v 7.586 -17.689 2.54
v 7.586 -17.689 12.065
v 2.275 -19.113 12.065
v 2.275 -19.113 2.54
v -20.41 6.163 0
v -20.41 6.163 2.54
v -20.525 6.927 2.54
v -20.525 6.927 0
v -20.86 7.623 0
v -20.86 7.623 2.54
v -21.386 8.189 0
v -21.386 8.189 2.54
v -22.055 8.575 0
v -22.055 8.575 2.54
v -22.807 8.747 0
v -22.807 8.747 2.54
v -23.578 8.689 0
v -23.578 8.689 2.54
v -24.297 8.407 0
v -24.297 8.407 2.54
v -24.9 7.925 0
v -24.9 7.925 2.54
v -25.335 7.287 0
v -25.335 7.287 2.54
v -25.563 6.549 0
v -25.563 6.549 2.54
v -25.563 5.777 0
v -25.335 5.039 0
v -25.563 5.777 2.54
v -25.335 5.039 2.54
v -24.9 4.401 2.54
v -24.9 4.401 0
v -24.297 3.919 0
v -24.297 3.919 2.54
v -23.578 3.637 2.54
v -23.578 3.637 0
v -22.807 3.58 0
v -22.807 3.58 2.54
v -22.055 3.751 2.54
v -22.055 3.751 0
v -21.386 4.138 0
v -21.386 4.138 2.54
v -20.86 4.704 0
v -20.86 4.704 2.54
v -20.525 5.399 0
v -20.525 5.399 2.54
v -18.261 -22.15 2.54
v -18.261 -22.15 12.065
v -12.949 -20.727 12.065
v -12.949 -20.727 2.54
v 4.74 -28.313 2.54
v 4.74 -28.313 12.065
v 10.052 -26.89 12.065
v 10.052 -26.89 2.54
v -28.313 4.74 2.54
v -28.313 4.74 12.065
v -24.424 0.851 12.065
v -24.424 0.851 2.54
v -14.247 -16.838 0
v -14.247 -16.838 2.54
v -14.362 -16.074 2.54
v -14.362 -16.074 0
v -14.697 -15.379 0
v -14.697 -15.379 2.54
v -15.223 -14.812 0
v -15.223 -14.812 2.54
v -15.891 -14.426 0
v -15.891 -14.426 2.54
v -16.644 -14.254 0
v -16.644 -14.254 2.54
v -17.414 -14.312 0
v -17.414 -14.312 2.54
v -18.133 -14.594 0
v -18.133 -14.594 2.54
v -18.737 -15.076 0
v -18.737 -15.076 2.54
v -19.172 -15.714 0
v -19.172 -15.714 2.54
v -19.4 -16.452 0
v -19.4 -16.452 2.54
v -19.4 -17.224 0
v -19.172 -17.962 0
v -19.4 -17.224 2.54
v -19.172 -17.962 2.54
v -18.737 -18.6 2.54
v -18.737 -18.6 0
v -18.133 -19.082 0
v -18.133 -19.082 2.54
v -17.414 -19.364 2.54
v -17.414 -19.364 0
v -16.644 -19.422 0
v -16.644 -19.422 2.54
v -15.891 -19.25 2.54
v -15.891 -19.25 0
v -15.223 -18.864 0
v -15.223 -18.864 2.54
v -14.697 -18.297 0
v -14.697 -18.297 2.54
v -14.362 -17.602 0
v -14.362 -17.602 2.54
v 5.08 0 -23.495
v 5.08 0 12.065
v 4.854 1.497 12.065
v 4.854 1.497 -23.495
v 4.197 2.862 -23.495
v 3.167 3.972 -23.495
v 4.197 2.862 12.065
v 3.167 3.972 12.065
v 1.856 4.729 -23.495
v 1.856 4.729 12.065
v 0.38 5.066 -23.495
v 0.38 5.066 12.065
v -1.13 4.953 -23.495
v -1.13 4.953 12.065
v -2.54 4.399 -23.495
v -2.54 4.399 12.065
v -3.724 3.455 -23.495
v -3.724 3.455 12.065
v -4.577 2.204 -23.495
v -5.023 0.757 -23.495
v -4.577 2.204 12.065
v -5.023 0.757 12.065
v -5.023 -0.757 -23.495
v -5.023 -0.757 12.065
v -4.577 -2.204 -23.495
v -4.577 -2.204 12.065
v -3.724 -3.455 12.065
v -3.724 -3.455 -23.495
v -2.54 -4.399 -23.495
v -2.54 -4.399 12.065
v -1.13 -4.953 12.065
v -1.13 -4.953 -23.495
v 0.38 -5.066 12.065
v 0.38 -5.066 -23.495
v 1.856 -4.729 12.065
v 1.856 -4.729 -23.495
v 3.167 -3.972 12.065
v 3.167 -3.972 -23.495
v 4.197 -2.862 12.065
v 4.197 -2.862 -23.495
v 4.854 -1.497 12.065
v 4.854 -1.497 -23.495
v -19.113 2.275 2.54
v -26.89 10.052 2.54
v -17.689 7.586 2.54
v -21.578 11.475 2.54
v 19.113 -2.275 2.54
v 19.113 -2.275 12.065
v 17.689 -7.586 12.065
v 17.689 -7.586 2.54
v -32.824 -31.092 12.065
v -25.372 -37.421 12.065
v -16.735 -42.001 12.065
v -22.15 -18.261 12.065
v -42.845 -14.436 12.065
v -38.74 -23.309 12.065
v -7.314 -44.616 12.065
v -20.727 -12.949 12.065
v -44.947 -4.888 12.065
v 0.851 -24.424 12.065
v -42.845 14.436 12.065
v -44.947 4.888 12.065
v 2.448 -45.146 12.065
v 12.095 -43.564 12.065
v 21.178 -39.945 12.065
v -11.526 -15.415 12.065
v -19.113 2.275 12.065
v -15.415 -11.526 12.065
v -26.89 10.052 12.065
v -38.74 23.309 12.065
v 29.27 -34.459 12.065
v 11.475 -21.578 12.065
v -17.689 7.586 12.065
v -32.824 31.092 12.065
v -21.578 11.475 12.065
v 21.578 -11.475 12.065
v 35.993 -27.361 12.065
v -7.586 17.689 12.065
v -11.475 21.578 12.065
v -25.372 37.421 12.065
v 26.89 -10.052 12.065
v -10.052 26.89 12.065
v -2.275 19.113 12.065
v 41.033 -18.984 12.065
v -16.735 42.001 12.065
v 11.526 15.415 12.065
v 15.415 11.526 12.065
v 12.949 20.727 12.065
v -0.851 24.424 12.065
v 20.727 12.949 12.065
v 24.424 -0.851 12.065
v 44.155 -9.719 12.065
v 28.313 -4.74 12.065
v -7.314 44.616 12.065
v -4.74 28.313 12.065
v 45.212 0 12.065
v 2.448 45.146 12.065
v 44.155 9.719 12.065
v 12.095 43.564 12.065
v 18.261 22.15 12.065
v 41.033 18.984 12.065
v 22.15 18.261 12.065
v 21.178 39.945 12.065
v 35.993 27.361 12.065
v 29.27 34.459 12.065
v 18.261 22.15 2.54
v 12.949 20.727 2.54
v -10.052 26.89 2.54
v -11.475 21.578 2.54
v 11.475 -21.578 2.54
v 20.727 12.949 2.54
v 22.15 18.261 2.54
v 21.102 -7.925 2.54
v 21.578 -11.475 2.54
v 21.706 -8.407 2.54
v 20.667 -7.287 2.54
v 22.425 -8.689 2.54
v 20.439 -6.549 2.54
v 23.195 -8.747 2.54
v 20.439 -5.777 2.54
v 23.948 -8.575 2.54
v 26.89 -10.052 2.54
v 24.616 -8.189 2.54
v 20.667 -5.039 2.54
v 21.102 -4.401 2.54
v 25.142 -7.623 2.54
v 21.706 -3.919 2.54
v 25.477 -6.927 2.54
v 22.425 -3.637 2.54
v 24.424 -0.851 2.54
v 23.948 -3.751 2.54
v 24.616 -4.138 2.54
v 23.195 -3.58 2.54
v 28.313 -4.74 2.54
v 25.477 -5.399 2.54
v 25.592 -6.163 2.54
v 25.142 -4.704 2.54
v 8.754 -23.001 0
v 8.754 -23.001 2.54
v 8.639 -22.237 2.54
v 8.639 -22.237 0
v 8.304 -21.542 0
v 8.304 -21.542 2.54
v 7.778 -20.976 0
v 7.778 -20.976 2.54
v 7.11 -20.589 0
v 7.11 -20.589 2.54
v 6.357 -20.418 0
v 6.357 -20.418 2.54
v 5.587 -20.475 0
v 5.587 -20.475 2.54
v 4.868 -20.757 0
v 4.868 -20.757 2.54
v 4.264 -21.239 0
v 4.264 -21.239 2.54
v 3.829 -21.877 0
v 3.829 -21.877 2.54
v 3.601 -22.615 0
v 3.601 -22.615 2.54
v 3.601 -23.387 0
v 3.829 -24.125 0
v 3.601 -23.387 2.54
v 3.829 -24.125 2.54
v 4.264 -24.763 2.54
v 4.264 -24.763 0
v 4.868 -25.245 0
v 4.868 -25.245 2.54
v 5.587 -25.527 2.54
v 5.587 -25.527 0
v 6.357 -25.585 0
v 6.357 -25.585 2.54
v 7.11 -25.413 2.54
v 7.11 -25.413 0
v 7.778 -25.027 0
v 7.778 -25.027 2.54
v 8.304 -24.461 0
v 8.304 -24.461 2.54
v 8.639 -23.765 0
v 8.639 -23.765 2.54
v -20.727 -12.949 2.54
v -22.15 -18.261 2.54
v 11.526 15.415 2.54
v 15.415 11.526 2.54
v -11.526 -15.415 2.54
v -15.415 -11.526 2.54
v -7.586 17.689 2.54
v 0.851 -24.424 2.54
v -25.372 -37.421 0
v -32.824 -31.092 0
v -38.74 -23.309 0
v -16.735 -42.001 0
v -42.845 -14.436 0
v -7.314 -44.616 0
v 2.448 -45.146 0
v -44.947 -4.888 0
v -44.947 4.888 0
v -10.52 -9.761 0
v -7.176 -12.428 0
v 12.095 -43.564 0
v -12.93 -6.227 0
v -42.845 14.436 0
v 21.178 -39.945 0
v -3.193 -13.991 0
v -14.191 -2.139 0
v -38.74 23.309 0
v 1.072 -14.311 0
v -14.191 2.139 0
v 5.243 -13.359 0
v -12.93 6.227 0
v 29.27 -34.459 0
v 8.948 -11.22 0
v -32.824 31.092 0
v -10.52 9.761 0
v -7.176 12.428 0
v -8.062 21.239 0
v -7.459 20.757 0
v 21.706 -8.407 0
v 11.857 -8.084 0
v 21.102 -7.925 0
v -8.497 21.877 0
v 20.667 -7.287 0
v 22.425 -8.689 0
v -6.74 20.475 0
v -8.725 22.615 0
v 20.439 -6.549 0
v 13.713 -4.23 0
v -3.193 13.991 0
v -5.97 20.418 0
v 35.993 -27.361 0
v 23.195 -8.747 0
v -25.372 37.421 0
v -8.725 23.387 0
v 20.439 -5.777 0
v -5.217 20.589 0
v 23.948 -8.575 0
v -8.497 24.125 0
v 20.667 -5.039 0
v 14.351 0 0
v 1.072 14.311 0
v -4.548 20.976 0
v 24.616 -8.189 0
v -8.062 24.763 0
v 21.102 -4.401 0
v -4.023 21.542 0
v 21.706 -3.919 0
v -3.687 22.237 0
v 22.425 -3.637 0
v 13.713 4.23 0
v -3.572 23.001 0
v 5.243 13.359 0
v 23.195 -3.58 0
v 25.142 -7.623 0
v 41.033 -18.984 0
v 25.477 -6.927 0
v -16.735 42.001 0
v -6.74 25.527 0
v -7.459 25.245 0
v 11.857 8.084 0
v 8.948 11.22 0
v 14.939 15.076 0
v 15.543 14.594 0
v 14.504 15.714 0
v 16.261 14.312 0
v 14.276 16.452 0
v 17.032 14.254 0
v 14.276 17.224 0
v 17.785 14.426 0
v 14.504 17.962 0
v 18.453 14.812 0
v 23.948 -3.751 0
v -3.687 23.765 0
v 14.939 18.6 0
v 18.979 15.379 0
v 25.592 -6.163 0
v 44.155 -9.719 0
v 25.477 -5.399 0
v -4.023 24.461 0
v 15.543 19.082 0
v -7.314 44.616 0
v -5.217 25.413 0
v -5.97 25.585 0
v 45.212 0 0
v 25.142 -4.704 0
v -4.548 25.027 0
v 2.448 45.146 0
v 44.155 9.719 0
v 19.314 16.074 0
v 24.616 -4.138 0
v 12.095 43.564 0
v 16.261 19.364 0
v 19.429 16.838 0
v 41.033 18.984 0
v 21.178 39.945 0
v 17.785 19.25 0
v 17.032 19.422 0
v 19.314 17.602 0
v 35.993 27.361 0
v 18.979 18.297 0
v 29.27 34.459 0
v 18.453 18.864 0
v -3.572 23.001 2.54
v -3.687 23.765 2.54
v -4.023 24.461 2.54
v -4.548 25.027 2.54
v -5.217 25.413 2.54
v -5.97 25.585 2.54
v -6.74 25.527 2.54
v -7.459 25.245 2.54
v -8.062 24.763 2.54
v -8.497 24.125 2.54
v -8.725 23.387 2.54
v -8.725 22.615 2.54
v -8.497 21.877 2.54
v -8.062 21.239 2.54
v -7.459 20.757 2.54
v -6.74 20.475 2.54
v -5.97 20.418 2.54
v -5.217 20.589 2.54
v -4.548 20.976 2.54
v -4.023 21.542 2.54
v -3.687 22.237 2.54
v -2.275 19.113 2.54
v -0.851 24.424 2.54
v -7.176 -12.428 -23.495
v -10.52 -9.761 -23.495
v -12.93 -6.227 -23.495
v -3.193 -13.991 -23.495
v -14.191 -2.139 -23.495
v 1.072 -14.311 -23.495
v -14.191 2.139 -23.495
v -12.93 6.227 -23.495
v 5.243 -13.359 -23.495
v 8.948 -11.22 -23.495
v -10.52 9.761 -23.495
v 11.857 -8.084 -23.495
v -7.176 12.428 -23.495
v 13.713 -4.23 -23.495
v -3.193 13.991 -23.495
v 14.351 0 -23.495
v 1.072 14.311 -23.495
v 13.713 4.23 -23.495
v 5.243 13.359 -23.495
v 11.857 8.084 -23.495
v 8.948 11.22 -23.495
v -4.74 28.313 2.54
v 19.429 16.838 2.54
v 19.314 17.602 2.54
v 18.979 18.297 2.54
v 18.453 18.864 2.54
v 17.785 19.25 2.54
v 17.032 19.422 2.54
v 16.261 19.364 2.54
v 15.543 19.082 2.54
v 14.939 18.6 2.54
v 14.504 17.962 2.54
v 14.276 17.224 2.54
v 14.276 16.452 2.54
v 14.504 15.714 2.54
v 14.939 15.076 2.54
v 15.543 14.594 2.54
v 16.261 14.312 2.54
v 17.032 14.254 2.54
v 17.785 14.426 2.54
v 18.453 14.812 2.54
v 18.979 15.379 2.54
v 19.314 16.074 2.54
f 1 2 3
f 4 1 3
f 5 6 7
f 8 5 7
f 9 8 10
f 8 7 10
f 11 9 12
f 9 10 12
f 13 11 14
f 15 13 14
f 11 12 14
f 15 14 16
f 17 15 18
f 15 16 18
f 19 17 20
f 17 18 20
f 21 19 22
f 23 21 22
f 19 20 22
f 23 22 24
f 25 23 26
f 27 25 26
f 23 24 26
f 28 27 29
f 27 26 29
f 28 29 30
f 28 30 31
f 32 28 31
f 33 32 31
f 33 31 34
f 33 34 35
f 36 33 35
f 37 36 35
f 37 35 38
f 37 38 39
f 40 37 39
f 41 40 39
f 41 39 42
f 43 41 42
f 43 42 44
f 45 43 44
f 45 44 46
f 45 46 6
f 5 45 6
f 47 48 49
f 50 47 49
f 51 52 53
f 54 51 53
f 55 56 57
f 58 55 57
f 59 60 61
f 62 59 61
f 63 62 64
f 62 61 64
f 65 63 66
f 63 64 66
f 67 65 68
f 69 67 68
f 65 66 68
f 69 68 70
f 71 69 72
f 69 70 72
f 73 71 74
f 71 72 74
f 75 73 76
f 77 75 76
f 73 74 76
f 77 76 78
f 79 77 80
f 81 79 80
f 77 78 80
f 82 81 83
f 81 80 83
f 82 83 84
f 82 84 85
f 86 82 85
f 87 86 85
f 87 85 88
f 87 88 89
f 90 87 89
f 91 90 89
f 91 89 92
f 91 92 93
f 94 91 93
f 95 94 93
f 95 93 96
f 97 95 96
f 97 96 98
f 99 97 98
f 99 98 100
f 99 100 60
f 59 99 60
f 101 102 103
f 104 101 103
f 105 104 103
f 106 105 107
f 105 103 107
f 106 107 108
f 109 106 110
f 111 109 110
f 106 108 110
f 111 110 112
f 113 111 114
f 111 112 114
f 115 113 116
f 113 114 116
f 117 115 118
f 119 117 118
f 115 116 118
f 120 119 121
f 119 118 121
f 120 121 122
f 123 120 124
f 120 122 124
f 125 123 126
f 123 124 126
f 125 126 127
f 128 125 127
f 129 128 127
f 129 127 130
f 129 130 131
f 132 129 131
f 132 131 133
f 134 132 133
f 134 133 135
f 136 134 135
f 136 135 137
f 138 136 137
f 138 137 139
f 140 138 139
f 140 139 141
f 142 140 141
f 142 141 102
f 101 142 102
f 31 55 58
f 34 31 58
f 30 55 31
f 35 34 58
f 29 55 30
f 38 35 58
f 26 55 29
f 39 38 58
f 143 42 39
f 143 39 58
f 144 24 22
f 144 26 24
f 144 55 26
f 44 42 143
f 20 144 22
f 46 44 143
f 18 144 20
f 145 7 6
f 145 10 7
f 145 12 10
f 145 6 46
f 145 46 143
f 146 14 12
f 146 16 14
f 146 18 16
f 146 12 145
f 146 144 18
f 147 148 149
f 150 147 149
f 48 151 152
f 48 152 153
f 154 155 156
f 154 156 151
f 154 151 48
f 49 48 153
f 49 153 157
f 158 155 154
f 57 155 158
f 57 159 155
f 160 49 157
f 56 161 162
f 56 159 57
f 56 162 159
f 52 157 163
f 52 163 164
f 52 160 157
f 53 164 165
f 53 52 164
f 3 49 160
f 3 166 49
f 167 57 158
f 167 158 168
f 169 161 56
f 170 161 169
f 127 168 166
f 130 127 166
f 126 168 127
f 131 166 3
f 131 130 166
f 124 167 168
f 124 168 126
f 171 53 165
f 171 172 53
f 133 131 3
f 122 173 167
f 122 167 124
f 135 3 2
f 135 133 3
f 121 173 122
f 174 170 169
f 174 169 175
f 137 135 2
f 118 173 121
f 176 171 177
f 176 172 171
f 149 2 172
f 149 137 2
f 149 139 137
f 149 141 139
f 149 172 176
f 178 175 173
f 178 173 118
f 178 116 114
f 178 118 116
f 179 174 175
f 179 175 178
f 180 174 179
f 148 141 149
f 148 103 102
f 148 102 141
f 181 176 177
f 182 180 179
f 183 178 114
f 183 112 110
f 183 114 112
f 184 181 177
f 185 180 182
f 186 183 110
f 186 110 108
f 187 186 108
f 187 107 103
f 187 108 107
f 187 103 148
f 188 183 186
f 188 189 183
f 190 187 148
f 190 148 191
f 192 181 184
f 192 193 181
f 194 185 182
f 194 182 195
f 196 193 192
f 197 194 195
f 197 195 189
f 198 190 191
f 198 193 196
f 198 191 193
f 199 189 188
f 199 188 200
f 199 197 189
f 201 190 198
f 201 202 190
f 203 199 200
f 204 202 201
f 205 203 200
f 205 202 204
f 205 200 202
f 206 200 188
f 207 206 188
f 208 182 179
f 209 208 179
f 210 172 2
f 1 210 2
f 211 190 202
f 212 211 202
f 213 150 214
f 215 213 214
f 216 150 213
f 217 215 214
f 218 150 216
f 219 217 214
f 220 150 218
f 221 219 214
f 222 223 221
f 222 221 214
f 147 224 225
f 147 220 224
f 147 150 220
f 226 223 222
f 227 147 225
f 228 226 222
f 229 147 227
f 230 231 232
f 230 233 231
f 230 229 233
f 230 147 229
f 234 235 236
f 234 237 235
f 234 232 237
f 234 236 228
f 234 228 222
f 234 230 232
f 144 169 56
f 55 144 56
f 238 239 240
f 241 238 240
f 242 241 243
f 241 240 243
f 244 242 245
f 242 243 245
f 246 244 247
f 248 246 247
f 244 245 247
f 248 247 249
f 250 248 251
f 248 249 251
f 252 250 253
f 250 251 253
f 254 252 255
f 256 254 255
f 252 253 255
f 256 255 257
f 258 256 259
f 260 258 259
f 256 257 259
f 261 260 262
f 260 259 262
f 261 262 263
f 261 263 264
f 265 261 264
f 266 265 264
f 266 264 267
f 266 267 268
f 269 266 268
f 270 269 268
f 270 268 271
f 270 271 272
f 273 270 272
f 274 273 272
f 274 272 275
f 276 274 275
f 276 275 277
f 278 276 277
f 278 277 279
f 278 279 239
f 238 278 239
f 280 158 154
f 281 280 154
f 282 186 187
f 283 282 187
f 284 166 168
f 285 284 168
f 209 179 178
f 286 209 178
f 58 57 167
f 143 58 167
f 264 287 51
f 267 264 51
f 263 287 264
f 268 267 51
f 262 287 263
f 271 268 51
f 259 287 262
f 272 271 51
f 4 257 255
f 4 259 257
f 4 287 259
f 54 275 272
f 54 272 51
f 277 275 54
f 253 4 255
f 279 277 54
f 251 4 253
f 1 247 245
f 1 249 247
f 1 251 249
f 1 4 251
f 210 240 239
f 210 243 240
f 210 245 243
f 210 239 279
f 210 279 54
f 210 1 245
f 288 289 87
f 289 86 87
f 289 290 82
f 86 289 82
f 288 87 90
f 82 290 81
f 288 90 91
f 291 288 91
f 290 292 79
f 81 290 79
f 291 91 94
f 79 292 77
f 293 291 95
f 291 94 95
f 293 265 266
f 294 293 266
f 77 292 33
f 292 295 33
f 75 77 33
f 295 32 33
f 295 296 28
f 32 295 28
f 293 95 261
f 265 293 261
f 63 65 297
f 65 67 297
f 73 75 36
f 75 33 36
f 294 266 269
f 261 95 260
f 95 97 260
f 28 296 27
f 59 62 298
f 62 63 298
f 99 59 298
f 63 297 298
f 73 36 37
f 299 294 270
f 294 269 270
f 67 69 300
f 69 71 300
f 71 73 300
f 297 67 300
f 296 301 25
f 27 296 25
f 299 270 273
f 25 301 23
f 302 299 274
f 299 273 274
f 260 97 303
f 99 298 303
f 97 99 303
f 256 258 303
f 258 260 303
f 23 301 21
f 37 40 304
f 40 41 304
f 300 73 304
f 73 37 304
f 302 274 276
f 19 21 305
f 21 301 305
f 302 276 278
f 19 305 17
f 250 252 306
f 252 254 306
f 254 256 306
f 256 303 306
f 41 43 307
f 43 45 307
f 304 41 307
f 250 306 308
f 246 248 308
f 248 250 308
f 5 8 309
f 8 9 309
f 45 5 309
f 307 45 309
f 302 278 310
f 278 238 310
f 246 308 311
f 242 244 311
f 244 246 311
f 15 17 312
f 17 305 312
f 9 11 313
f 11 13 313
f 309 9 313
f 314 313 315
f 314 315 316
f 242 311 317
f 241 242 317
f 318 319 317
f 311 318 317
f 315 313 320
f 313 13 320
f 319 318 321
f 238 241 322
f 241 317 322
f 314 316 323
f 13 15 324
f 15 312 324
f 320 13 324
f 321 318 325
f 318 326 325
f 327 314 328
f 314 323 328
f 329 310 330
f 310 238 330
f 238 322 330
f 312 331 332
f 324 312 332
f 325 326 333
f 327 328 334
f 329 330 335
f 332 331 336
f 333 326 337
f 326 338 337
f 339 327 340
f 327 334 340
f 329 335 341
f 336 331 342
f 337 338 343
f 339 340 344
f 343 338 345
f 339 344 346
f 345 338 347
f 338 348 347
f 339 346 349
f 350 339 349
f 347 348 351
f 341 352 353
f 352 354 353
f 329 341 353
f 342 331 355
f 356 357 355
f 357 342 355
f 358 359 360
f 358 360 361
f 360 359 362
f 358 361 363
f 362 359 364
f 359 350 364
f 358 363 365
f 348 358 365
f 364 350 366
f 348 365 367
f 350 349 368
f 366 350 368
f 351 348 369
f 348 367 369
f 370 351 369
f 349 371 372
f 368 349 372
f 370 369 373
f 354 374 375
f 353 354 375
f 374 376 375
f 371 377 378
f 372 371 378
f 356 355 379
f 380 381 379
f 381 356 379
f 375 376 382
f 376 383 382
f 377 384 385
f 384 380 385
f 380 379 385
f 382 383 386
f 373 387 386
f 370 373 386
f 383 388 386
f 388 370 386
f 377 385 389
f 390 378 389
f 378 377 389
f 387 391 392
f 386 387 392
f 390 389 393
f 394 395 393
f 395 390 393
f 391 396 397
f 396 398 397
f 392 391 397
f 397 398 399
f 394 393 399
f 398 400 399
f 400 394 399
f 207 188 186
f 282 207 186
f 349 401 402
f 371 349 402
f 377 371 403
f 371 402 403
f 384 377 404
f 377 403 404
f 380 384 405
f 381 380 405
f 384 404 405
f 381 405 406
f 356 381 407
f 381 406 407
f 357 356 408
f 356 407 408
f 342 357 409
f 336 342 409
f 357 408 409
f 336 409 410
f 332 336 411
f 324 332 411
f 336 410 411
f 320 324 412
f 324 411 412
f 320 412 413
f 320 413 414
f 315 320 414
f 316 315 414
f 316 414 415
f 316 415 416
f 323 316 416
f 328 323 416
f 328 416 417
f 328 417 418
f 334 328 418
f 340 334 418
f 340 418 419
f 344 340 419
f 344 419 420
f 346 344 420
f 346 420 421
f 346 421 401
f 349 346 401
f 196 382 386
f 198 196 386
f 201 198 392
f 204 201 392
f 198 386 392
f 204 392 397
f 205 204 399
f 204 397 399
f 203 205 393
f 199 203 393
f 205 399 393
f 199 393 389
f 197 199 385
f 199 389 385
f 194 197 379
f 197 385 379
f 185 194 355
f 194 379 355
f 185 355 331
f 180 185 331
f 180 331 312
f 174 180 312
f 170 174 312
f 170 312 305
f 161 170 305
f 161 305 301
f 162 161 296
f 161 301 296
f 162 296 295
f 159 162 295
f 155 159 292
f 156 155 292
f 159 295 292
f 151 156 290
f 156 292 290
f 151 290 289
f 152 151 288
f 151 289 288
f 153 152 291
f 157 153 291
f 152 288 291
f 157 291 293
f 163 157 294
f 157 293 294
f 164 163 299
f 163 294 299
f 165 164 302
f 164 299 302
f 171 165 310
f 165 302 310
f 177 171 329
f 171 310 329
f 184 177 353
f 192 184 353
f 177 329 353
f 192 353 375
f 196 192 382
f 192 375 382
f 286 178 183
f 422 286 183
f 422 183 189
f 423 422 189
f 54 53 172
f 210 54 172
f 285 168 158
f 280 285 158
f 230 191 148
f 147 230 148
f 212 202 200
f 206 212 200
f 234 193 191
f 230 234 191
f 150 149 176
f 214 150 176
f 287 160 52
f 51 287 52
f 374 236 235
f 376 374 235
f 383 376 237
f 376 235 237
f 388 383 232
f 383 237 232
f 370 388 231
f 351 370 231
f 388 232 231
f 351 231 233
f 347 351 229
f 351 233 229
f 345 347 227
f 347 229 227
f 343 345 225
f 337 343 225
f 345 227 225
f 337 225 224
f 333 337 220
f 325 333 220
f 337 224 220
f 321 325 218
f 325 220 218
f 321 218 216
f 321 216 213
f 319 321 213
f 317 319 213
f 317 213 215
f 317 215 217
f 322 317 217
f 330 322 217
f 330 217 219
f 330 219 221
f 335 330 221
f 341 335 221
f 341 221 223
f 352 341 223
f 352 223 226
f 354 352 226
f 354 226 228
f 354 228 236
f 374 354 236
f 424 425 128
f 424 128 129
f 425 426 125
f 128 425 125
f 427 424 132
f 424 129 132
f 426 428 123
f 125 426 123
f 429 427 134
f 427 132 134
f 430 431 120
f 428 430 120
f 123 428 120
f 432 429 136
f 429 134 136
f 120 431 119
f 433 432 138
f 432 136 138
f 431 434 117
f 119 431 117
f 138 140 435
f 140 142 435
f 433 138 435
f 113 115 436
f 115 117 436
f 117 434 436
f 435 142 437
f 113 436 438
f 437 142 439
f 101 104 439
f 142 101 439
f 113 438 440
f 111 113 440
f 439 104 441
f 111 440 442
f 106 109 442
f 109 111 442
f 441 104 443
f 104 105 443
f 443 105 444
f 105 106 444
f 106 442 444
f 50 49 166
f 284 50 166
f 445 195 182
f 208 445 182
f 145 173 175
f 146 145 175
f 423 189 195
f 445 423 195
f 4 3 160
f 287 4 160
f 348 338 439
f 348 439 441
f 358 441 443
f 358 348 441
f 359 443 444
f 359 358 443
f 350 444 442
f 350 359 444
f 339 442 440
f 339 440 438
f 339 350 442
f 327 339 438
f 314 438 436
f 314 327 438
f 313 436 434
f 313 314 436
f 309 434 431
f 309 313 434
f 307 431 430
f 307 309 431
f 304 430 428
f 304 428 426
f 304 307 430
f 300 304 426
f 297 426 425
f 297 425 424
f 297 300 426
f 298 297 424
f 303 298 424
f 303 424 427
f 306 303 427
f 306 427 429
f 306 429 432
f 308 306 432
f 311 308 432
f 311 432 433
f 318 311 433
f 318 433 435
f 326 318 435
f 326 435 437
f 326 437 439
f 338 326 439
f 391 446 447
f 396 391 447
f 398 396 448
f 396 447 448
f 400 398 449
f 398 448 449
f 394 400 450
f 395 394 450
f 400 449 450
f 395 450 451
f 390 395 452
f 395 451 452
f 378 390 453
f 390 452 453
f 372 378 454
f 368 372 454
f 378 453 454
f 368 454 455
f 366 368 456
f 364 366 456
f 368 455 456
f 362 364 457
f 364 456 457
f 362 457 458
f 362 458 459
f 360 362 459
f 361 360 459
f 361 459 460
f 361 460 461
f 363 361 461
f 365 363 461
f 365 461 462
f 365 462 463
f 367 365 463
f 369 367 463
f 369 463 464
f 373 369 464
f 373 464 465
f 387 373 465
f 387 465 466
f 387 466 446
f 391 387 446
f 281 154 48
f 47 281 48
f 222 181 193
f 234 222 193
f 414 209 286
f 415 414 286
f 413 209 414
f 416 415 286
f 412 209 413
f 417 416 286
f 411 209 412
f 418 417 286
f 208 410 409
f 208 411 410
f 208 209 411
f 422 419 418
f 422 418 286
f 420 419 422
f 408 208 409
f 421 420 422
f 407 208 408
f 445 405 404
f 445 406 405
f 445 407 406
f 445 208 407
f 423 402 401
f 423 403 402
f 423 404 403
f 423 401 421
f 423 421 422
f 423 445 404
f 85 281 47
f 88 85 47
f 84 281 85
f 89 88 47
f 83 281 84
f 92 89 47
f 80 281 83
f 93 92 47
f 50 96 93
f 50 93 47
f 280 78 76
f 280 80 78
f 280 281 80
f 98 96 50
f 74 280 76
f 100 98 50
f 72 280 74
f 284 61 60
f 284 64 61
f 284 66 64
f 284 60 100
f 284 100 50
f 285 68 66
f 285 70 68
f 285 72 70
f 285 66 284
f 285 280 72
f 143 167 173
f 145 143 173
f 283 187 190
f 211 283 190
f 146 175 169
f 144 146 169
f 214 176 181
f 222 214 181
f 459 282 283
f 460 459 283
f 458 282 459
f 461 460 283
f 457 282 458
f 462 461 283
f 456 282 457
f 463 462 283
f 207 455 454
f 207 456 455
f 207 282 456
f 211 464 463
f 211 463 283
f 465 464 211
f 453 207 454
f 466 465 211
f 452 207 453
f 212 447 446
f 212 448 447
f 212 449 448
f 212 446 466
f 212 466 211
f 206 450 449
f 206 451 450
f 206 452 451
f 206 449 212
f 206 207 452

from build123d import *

# Parameters (mm, degrees)
F0_R      = 45.212
F1_DEPTH  = 12.065
F2_R      = 2.5908
F3_DEPTH  = 25.4
F4_R      = 14.5415
F5_DEPTH  = 25.4
F7_DEPTH  = 9.525
F8_R      = 15.24
F9_DEPTH  = 12.065
F10_R     = 14.351
F11_DEPTH = 35.56
F12_R     = 5.08
F13_DEPTH = 38.1


# Not quite as in the source:
# - a feature names something its author has since deleted; it is built from what else it names


with BuildPart() as f1:
    # F0 (on Top) → F1 (new body)
    with BuildSketch(Plane.XY):
        Circle(F0_R)
    extrude(amount=F1_DEPTH)

    # F2 (on face) → F3 (cut)
    with BuildSketch(Plane.XY.offset(12.065)):
        with Locations((-6.1631285115, 23.0011087385)):
            Circle(F2_R)
        with Locations((-23.0011087385, 6.1631285115)):
            Circle(F2_R)
        with Locations((-16.837980227, -16.837980227)):
            Circle(F2_R)
        with Locations((6.1631285115, -23.0011087385)):
            Circle(F2_R)
        with Locations((23.0011087385, -6.1631285115)):
            Circle(F2_R)
        with Locations((16.837980227, 16.837980227)):
            Circle(F2_R)
    extrude(amount=-F3_DEPTH, mode=Mode.SUBTRACT)

    # F4 (on face) → F5 (cut)
    with BuildSketch(Plane.XY.offset(12.065)):
        Circle(F4_R)
    extrude(amount=-F5_DEPTH, mode=Mode.SUBTRACT)

    # F6 (on face) → F7 (cut)
    with BuildSketch(Plane.XY.offset(12.065)):
        Polygon((-4.7398149494, 28.3129872672), (-10.0516934782, 26.8896737052), (-11.4750070402, 21.5777951764), (-7.5864420736, 17.6892302098), (-2.2745635448, 19.1125437718), (-0.8512499828, 24.4244223006), align=None)
        Polygon((22.1498587557, 18.2612937891), (18.2612937891, 22.1498587557), (12.9494152603, 20.7265451937), (11.5261016983, 15.4146666649), (15.4146666649, 11.5261016983), (20.7265451937, 12.9494152603), align=None)
        Polygon((26.8896737052, -10.0516934782), (28.3129872672, -4.7398149494), (24.4244223006, -0.8512499828), (19.1125437718, -2.2745635448), (17.6892302098, -7.5864420736), (21.5777951764, -11.4750070402), align=None)
        Polygon((4.7398149494, -28.3129872672), (10.0516934782, -26.8896737052), (11.4750070402, -21.5777951764), (7.5864420736, -17.6892302098), (2.2745635448, -19.1125437718), (0.8512499828, -24.4244223006), align=None)
        Polygon((-22.1498587557, -18.2612937891), (-18.2612937891, -22.1498587557), (-12.9494152603, -20.7265451937), (-11.5261016983, -15.4146666649), (-15.4146666649, -11.5261016983), (-20.7265451937, -12.9494152603), align=None)
        Polygon((-26.8896737052, 10.0516934782), (-28.3129872672, 4.7398149494), (-24.4244223006, 0.8512499828), (-19.1125437718, 2.2745635448), (-17.6892302098, 7.5864420736), (-21.5777951764, 11.4750070402), align=None)
    extrude(amount=-F7_DEPTH, mode=Mode.SUBTRACT)

    # F8 (on face) → F9 (join)
    with BuildSketch(Plane.XY.offset(12.065)):
        Circle(F8_R)
    extrude(amount=-F9_DEPTH)

    # F10 (on face) → F11 (join)
    with BuildSketch(Plane.XY.offset(12.065)):
        Circle(F10_R)
    extrude(amount=-F11_DEPTH)

    # F12 (on face) → F13 (cut)
    with BuildSketch(Plane.XY.offset(12.065)):
        Circle(F12_R)
    extrude(amount=-F13_DEPTH, mode=Mode.SUBTRACT)


solid = f1.part
